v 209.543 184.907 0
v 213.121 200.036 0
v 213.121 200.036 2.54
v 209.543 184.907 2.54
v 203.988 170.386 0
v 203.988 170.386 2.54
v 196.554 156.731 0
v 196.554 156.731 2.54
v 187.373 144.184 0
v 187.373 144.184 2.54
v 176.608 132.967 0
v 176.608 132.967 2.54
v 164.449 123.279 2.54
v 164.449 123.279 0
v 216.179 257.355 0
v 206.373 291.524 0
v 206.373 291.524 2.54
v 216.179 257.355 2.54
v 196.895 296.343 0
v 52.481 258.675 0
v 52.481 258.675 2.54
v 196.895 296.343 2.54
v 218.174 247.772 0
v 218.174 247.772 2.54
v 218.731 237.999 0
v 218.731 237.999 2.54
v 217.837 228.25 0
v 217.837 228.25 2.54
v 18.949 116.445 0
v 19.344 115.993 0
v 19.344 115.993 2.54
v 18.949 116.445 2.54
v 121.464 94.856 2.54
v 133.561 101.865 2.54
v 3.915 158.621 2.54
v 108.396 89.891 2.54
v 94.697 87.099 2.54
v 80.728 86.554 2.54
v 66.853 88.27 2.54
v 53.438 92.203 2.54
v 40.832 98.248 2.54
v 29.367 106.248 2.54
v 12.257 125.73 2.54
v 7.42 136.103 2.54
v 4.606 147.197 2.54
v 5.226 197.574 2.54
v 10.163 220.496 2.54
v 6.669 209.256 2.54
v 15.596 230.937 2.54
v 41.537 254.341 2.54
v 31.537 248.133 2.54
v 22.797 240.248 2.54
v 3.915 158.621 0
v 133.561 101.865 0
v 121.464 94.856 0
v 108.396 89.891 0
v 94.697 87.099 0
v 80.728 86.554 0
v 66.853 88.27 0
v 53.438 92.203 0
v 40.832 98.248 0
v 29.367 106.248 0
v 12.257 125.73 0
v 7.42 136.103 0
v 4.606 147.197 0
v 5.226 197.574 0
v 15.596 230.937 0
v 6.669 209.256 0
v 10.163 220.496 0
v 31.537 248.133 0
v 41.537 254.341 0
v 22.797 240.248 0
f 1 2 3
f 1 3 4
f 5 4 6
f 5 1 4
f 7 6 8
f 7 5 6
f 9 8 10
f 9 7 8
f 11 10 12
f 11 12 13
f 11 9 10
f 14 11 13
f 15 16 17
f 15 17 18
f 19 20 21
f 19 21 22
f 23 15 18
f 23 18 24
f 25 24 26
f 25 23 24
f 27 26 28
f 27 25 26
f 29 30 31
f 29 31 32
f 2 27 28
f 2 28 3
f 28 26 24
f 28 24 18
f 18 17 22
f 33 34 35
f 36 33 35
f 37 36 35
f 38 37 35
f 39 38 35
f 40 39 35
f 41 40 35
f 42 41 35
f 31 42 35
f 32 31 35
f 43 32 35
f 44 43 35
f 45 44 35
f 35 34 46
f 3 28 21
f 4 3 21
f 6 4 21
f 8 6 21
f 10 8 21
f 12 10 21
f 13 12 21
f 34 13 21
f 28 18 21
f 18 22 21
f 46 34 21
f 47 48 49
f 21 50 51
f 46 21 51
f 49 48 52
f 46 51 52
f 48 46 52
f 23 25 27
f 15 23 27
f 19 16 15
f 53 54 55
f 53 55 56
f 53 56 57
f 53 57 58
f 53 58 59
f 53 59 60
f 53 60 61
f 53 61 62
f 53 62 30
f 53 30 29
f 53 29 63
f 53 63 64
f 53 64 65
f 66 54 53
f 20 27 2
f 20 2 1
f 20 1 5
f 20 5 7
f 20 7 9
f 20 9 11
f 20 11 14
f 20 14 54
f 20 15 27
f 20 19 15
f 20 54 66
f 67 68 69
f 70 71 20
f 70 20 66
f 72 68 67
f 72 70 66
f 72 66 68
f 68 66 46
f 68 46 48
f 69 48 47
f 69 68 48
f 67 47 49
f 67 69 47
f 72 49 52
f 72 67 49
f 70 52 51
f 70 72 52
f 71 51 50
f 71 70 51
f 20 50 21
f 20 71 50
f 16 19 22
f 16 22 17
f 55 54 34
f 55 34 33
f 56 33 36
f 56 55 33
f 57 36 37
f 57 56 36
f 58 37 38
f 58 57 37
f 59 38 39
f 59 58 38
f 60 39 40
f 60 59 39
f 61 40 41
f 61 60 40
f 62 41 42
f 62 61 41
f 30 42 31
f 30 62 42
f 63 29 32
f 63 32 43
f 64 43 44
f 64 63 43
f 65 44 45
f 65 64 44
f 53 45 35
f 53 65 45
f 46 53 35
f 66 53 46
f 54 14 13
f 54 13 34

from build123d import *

# Parameters (mm, degrees)
BOSS_EXTRUDE1_DEPTH = 2.54


with BuildPart() as part:
    # Sketch2 → Boss-Extrude1 (new body)
    with BuildSketch(Plane.XY):
        with BuildLine():
            Line((52.480544155, 258.674987582), (196.894837031, 296.342844243))
            Line((196.894837031, 296.342844243), (206.373128662, 291.523930207))
            Line((206.373128662, 291.523930207), (216.178620917, 257.355486833))
            ThreePointArc((216.178620917, 257.355486833), (218.633828258, 242.895591751), (217.836941691, 228.250402074))
            Line((217.836941691, 228.250402074), (213.120538575, 200.036424744))
            ThreePointArc((213.120538575, 200.036424744), (196.554033533, 156.731222664), (164.448728673, 123.279182124))
            Line((164.448728673, 123.279182124), (133.560538269, 101.865242067))
            ThreePointArc((133.560538269, 101.865242067), (73.755681182, 87.130889432), (19.343587989, 115.99342905))
            Line((19.343587989, 115.99342905), (18.948822289, 116.444928865))
            ThreePointArc((18.948822289, 116.444928865), (7.419590663, 136.102703369), (3.91533799, 158.620951381))
            Line((3.91533799, 158.620951381), (5.226431104, 197.573753427))
            ThreePointArc((5.226431104, 197.573753427), (18.98894665, 235.75335118), (52.480544155, 258.674987582))
        make_face()
    extrude(amount=BOSS_EXTRUDE1_DEPTH)


solid = part.part
